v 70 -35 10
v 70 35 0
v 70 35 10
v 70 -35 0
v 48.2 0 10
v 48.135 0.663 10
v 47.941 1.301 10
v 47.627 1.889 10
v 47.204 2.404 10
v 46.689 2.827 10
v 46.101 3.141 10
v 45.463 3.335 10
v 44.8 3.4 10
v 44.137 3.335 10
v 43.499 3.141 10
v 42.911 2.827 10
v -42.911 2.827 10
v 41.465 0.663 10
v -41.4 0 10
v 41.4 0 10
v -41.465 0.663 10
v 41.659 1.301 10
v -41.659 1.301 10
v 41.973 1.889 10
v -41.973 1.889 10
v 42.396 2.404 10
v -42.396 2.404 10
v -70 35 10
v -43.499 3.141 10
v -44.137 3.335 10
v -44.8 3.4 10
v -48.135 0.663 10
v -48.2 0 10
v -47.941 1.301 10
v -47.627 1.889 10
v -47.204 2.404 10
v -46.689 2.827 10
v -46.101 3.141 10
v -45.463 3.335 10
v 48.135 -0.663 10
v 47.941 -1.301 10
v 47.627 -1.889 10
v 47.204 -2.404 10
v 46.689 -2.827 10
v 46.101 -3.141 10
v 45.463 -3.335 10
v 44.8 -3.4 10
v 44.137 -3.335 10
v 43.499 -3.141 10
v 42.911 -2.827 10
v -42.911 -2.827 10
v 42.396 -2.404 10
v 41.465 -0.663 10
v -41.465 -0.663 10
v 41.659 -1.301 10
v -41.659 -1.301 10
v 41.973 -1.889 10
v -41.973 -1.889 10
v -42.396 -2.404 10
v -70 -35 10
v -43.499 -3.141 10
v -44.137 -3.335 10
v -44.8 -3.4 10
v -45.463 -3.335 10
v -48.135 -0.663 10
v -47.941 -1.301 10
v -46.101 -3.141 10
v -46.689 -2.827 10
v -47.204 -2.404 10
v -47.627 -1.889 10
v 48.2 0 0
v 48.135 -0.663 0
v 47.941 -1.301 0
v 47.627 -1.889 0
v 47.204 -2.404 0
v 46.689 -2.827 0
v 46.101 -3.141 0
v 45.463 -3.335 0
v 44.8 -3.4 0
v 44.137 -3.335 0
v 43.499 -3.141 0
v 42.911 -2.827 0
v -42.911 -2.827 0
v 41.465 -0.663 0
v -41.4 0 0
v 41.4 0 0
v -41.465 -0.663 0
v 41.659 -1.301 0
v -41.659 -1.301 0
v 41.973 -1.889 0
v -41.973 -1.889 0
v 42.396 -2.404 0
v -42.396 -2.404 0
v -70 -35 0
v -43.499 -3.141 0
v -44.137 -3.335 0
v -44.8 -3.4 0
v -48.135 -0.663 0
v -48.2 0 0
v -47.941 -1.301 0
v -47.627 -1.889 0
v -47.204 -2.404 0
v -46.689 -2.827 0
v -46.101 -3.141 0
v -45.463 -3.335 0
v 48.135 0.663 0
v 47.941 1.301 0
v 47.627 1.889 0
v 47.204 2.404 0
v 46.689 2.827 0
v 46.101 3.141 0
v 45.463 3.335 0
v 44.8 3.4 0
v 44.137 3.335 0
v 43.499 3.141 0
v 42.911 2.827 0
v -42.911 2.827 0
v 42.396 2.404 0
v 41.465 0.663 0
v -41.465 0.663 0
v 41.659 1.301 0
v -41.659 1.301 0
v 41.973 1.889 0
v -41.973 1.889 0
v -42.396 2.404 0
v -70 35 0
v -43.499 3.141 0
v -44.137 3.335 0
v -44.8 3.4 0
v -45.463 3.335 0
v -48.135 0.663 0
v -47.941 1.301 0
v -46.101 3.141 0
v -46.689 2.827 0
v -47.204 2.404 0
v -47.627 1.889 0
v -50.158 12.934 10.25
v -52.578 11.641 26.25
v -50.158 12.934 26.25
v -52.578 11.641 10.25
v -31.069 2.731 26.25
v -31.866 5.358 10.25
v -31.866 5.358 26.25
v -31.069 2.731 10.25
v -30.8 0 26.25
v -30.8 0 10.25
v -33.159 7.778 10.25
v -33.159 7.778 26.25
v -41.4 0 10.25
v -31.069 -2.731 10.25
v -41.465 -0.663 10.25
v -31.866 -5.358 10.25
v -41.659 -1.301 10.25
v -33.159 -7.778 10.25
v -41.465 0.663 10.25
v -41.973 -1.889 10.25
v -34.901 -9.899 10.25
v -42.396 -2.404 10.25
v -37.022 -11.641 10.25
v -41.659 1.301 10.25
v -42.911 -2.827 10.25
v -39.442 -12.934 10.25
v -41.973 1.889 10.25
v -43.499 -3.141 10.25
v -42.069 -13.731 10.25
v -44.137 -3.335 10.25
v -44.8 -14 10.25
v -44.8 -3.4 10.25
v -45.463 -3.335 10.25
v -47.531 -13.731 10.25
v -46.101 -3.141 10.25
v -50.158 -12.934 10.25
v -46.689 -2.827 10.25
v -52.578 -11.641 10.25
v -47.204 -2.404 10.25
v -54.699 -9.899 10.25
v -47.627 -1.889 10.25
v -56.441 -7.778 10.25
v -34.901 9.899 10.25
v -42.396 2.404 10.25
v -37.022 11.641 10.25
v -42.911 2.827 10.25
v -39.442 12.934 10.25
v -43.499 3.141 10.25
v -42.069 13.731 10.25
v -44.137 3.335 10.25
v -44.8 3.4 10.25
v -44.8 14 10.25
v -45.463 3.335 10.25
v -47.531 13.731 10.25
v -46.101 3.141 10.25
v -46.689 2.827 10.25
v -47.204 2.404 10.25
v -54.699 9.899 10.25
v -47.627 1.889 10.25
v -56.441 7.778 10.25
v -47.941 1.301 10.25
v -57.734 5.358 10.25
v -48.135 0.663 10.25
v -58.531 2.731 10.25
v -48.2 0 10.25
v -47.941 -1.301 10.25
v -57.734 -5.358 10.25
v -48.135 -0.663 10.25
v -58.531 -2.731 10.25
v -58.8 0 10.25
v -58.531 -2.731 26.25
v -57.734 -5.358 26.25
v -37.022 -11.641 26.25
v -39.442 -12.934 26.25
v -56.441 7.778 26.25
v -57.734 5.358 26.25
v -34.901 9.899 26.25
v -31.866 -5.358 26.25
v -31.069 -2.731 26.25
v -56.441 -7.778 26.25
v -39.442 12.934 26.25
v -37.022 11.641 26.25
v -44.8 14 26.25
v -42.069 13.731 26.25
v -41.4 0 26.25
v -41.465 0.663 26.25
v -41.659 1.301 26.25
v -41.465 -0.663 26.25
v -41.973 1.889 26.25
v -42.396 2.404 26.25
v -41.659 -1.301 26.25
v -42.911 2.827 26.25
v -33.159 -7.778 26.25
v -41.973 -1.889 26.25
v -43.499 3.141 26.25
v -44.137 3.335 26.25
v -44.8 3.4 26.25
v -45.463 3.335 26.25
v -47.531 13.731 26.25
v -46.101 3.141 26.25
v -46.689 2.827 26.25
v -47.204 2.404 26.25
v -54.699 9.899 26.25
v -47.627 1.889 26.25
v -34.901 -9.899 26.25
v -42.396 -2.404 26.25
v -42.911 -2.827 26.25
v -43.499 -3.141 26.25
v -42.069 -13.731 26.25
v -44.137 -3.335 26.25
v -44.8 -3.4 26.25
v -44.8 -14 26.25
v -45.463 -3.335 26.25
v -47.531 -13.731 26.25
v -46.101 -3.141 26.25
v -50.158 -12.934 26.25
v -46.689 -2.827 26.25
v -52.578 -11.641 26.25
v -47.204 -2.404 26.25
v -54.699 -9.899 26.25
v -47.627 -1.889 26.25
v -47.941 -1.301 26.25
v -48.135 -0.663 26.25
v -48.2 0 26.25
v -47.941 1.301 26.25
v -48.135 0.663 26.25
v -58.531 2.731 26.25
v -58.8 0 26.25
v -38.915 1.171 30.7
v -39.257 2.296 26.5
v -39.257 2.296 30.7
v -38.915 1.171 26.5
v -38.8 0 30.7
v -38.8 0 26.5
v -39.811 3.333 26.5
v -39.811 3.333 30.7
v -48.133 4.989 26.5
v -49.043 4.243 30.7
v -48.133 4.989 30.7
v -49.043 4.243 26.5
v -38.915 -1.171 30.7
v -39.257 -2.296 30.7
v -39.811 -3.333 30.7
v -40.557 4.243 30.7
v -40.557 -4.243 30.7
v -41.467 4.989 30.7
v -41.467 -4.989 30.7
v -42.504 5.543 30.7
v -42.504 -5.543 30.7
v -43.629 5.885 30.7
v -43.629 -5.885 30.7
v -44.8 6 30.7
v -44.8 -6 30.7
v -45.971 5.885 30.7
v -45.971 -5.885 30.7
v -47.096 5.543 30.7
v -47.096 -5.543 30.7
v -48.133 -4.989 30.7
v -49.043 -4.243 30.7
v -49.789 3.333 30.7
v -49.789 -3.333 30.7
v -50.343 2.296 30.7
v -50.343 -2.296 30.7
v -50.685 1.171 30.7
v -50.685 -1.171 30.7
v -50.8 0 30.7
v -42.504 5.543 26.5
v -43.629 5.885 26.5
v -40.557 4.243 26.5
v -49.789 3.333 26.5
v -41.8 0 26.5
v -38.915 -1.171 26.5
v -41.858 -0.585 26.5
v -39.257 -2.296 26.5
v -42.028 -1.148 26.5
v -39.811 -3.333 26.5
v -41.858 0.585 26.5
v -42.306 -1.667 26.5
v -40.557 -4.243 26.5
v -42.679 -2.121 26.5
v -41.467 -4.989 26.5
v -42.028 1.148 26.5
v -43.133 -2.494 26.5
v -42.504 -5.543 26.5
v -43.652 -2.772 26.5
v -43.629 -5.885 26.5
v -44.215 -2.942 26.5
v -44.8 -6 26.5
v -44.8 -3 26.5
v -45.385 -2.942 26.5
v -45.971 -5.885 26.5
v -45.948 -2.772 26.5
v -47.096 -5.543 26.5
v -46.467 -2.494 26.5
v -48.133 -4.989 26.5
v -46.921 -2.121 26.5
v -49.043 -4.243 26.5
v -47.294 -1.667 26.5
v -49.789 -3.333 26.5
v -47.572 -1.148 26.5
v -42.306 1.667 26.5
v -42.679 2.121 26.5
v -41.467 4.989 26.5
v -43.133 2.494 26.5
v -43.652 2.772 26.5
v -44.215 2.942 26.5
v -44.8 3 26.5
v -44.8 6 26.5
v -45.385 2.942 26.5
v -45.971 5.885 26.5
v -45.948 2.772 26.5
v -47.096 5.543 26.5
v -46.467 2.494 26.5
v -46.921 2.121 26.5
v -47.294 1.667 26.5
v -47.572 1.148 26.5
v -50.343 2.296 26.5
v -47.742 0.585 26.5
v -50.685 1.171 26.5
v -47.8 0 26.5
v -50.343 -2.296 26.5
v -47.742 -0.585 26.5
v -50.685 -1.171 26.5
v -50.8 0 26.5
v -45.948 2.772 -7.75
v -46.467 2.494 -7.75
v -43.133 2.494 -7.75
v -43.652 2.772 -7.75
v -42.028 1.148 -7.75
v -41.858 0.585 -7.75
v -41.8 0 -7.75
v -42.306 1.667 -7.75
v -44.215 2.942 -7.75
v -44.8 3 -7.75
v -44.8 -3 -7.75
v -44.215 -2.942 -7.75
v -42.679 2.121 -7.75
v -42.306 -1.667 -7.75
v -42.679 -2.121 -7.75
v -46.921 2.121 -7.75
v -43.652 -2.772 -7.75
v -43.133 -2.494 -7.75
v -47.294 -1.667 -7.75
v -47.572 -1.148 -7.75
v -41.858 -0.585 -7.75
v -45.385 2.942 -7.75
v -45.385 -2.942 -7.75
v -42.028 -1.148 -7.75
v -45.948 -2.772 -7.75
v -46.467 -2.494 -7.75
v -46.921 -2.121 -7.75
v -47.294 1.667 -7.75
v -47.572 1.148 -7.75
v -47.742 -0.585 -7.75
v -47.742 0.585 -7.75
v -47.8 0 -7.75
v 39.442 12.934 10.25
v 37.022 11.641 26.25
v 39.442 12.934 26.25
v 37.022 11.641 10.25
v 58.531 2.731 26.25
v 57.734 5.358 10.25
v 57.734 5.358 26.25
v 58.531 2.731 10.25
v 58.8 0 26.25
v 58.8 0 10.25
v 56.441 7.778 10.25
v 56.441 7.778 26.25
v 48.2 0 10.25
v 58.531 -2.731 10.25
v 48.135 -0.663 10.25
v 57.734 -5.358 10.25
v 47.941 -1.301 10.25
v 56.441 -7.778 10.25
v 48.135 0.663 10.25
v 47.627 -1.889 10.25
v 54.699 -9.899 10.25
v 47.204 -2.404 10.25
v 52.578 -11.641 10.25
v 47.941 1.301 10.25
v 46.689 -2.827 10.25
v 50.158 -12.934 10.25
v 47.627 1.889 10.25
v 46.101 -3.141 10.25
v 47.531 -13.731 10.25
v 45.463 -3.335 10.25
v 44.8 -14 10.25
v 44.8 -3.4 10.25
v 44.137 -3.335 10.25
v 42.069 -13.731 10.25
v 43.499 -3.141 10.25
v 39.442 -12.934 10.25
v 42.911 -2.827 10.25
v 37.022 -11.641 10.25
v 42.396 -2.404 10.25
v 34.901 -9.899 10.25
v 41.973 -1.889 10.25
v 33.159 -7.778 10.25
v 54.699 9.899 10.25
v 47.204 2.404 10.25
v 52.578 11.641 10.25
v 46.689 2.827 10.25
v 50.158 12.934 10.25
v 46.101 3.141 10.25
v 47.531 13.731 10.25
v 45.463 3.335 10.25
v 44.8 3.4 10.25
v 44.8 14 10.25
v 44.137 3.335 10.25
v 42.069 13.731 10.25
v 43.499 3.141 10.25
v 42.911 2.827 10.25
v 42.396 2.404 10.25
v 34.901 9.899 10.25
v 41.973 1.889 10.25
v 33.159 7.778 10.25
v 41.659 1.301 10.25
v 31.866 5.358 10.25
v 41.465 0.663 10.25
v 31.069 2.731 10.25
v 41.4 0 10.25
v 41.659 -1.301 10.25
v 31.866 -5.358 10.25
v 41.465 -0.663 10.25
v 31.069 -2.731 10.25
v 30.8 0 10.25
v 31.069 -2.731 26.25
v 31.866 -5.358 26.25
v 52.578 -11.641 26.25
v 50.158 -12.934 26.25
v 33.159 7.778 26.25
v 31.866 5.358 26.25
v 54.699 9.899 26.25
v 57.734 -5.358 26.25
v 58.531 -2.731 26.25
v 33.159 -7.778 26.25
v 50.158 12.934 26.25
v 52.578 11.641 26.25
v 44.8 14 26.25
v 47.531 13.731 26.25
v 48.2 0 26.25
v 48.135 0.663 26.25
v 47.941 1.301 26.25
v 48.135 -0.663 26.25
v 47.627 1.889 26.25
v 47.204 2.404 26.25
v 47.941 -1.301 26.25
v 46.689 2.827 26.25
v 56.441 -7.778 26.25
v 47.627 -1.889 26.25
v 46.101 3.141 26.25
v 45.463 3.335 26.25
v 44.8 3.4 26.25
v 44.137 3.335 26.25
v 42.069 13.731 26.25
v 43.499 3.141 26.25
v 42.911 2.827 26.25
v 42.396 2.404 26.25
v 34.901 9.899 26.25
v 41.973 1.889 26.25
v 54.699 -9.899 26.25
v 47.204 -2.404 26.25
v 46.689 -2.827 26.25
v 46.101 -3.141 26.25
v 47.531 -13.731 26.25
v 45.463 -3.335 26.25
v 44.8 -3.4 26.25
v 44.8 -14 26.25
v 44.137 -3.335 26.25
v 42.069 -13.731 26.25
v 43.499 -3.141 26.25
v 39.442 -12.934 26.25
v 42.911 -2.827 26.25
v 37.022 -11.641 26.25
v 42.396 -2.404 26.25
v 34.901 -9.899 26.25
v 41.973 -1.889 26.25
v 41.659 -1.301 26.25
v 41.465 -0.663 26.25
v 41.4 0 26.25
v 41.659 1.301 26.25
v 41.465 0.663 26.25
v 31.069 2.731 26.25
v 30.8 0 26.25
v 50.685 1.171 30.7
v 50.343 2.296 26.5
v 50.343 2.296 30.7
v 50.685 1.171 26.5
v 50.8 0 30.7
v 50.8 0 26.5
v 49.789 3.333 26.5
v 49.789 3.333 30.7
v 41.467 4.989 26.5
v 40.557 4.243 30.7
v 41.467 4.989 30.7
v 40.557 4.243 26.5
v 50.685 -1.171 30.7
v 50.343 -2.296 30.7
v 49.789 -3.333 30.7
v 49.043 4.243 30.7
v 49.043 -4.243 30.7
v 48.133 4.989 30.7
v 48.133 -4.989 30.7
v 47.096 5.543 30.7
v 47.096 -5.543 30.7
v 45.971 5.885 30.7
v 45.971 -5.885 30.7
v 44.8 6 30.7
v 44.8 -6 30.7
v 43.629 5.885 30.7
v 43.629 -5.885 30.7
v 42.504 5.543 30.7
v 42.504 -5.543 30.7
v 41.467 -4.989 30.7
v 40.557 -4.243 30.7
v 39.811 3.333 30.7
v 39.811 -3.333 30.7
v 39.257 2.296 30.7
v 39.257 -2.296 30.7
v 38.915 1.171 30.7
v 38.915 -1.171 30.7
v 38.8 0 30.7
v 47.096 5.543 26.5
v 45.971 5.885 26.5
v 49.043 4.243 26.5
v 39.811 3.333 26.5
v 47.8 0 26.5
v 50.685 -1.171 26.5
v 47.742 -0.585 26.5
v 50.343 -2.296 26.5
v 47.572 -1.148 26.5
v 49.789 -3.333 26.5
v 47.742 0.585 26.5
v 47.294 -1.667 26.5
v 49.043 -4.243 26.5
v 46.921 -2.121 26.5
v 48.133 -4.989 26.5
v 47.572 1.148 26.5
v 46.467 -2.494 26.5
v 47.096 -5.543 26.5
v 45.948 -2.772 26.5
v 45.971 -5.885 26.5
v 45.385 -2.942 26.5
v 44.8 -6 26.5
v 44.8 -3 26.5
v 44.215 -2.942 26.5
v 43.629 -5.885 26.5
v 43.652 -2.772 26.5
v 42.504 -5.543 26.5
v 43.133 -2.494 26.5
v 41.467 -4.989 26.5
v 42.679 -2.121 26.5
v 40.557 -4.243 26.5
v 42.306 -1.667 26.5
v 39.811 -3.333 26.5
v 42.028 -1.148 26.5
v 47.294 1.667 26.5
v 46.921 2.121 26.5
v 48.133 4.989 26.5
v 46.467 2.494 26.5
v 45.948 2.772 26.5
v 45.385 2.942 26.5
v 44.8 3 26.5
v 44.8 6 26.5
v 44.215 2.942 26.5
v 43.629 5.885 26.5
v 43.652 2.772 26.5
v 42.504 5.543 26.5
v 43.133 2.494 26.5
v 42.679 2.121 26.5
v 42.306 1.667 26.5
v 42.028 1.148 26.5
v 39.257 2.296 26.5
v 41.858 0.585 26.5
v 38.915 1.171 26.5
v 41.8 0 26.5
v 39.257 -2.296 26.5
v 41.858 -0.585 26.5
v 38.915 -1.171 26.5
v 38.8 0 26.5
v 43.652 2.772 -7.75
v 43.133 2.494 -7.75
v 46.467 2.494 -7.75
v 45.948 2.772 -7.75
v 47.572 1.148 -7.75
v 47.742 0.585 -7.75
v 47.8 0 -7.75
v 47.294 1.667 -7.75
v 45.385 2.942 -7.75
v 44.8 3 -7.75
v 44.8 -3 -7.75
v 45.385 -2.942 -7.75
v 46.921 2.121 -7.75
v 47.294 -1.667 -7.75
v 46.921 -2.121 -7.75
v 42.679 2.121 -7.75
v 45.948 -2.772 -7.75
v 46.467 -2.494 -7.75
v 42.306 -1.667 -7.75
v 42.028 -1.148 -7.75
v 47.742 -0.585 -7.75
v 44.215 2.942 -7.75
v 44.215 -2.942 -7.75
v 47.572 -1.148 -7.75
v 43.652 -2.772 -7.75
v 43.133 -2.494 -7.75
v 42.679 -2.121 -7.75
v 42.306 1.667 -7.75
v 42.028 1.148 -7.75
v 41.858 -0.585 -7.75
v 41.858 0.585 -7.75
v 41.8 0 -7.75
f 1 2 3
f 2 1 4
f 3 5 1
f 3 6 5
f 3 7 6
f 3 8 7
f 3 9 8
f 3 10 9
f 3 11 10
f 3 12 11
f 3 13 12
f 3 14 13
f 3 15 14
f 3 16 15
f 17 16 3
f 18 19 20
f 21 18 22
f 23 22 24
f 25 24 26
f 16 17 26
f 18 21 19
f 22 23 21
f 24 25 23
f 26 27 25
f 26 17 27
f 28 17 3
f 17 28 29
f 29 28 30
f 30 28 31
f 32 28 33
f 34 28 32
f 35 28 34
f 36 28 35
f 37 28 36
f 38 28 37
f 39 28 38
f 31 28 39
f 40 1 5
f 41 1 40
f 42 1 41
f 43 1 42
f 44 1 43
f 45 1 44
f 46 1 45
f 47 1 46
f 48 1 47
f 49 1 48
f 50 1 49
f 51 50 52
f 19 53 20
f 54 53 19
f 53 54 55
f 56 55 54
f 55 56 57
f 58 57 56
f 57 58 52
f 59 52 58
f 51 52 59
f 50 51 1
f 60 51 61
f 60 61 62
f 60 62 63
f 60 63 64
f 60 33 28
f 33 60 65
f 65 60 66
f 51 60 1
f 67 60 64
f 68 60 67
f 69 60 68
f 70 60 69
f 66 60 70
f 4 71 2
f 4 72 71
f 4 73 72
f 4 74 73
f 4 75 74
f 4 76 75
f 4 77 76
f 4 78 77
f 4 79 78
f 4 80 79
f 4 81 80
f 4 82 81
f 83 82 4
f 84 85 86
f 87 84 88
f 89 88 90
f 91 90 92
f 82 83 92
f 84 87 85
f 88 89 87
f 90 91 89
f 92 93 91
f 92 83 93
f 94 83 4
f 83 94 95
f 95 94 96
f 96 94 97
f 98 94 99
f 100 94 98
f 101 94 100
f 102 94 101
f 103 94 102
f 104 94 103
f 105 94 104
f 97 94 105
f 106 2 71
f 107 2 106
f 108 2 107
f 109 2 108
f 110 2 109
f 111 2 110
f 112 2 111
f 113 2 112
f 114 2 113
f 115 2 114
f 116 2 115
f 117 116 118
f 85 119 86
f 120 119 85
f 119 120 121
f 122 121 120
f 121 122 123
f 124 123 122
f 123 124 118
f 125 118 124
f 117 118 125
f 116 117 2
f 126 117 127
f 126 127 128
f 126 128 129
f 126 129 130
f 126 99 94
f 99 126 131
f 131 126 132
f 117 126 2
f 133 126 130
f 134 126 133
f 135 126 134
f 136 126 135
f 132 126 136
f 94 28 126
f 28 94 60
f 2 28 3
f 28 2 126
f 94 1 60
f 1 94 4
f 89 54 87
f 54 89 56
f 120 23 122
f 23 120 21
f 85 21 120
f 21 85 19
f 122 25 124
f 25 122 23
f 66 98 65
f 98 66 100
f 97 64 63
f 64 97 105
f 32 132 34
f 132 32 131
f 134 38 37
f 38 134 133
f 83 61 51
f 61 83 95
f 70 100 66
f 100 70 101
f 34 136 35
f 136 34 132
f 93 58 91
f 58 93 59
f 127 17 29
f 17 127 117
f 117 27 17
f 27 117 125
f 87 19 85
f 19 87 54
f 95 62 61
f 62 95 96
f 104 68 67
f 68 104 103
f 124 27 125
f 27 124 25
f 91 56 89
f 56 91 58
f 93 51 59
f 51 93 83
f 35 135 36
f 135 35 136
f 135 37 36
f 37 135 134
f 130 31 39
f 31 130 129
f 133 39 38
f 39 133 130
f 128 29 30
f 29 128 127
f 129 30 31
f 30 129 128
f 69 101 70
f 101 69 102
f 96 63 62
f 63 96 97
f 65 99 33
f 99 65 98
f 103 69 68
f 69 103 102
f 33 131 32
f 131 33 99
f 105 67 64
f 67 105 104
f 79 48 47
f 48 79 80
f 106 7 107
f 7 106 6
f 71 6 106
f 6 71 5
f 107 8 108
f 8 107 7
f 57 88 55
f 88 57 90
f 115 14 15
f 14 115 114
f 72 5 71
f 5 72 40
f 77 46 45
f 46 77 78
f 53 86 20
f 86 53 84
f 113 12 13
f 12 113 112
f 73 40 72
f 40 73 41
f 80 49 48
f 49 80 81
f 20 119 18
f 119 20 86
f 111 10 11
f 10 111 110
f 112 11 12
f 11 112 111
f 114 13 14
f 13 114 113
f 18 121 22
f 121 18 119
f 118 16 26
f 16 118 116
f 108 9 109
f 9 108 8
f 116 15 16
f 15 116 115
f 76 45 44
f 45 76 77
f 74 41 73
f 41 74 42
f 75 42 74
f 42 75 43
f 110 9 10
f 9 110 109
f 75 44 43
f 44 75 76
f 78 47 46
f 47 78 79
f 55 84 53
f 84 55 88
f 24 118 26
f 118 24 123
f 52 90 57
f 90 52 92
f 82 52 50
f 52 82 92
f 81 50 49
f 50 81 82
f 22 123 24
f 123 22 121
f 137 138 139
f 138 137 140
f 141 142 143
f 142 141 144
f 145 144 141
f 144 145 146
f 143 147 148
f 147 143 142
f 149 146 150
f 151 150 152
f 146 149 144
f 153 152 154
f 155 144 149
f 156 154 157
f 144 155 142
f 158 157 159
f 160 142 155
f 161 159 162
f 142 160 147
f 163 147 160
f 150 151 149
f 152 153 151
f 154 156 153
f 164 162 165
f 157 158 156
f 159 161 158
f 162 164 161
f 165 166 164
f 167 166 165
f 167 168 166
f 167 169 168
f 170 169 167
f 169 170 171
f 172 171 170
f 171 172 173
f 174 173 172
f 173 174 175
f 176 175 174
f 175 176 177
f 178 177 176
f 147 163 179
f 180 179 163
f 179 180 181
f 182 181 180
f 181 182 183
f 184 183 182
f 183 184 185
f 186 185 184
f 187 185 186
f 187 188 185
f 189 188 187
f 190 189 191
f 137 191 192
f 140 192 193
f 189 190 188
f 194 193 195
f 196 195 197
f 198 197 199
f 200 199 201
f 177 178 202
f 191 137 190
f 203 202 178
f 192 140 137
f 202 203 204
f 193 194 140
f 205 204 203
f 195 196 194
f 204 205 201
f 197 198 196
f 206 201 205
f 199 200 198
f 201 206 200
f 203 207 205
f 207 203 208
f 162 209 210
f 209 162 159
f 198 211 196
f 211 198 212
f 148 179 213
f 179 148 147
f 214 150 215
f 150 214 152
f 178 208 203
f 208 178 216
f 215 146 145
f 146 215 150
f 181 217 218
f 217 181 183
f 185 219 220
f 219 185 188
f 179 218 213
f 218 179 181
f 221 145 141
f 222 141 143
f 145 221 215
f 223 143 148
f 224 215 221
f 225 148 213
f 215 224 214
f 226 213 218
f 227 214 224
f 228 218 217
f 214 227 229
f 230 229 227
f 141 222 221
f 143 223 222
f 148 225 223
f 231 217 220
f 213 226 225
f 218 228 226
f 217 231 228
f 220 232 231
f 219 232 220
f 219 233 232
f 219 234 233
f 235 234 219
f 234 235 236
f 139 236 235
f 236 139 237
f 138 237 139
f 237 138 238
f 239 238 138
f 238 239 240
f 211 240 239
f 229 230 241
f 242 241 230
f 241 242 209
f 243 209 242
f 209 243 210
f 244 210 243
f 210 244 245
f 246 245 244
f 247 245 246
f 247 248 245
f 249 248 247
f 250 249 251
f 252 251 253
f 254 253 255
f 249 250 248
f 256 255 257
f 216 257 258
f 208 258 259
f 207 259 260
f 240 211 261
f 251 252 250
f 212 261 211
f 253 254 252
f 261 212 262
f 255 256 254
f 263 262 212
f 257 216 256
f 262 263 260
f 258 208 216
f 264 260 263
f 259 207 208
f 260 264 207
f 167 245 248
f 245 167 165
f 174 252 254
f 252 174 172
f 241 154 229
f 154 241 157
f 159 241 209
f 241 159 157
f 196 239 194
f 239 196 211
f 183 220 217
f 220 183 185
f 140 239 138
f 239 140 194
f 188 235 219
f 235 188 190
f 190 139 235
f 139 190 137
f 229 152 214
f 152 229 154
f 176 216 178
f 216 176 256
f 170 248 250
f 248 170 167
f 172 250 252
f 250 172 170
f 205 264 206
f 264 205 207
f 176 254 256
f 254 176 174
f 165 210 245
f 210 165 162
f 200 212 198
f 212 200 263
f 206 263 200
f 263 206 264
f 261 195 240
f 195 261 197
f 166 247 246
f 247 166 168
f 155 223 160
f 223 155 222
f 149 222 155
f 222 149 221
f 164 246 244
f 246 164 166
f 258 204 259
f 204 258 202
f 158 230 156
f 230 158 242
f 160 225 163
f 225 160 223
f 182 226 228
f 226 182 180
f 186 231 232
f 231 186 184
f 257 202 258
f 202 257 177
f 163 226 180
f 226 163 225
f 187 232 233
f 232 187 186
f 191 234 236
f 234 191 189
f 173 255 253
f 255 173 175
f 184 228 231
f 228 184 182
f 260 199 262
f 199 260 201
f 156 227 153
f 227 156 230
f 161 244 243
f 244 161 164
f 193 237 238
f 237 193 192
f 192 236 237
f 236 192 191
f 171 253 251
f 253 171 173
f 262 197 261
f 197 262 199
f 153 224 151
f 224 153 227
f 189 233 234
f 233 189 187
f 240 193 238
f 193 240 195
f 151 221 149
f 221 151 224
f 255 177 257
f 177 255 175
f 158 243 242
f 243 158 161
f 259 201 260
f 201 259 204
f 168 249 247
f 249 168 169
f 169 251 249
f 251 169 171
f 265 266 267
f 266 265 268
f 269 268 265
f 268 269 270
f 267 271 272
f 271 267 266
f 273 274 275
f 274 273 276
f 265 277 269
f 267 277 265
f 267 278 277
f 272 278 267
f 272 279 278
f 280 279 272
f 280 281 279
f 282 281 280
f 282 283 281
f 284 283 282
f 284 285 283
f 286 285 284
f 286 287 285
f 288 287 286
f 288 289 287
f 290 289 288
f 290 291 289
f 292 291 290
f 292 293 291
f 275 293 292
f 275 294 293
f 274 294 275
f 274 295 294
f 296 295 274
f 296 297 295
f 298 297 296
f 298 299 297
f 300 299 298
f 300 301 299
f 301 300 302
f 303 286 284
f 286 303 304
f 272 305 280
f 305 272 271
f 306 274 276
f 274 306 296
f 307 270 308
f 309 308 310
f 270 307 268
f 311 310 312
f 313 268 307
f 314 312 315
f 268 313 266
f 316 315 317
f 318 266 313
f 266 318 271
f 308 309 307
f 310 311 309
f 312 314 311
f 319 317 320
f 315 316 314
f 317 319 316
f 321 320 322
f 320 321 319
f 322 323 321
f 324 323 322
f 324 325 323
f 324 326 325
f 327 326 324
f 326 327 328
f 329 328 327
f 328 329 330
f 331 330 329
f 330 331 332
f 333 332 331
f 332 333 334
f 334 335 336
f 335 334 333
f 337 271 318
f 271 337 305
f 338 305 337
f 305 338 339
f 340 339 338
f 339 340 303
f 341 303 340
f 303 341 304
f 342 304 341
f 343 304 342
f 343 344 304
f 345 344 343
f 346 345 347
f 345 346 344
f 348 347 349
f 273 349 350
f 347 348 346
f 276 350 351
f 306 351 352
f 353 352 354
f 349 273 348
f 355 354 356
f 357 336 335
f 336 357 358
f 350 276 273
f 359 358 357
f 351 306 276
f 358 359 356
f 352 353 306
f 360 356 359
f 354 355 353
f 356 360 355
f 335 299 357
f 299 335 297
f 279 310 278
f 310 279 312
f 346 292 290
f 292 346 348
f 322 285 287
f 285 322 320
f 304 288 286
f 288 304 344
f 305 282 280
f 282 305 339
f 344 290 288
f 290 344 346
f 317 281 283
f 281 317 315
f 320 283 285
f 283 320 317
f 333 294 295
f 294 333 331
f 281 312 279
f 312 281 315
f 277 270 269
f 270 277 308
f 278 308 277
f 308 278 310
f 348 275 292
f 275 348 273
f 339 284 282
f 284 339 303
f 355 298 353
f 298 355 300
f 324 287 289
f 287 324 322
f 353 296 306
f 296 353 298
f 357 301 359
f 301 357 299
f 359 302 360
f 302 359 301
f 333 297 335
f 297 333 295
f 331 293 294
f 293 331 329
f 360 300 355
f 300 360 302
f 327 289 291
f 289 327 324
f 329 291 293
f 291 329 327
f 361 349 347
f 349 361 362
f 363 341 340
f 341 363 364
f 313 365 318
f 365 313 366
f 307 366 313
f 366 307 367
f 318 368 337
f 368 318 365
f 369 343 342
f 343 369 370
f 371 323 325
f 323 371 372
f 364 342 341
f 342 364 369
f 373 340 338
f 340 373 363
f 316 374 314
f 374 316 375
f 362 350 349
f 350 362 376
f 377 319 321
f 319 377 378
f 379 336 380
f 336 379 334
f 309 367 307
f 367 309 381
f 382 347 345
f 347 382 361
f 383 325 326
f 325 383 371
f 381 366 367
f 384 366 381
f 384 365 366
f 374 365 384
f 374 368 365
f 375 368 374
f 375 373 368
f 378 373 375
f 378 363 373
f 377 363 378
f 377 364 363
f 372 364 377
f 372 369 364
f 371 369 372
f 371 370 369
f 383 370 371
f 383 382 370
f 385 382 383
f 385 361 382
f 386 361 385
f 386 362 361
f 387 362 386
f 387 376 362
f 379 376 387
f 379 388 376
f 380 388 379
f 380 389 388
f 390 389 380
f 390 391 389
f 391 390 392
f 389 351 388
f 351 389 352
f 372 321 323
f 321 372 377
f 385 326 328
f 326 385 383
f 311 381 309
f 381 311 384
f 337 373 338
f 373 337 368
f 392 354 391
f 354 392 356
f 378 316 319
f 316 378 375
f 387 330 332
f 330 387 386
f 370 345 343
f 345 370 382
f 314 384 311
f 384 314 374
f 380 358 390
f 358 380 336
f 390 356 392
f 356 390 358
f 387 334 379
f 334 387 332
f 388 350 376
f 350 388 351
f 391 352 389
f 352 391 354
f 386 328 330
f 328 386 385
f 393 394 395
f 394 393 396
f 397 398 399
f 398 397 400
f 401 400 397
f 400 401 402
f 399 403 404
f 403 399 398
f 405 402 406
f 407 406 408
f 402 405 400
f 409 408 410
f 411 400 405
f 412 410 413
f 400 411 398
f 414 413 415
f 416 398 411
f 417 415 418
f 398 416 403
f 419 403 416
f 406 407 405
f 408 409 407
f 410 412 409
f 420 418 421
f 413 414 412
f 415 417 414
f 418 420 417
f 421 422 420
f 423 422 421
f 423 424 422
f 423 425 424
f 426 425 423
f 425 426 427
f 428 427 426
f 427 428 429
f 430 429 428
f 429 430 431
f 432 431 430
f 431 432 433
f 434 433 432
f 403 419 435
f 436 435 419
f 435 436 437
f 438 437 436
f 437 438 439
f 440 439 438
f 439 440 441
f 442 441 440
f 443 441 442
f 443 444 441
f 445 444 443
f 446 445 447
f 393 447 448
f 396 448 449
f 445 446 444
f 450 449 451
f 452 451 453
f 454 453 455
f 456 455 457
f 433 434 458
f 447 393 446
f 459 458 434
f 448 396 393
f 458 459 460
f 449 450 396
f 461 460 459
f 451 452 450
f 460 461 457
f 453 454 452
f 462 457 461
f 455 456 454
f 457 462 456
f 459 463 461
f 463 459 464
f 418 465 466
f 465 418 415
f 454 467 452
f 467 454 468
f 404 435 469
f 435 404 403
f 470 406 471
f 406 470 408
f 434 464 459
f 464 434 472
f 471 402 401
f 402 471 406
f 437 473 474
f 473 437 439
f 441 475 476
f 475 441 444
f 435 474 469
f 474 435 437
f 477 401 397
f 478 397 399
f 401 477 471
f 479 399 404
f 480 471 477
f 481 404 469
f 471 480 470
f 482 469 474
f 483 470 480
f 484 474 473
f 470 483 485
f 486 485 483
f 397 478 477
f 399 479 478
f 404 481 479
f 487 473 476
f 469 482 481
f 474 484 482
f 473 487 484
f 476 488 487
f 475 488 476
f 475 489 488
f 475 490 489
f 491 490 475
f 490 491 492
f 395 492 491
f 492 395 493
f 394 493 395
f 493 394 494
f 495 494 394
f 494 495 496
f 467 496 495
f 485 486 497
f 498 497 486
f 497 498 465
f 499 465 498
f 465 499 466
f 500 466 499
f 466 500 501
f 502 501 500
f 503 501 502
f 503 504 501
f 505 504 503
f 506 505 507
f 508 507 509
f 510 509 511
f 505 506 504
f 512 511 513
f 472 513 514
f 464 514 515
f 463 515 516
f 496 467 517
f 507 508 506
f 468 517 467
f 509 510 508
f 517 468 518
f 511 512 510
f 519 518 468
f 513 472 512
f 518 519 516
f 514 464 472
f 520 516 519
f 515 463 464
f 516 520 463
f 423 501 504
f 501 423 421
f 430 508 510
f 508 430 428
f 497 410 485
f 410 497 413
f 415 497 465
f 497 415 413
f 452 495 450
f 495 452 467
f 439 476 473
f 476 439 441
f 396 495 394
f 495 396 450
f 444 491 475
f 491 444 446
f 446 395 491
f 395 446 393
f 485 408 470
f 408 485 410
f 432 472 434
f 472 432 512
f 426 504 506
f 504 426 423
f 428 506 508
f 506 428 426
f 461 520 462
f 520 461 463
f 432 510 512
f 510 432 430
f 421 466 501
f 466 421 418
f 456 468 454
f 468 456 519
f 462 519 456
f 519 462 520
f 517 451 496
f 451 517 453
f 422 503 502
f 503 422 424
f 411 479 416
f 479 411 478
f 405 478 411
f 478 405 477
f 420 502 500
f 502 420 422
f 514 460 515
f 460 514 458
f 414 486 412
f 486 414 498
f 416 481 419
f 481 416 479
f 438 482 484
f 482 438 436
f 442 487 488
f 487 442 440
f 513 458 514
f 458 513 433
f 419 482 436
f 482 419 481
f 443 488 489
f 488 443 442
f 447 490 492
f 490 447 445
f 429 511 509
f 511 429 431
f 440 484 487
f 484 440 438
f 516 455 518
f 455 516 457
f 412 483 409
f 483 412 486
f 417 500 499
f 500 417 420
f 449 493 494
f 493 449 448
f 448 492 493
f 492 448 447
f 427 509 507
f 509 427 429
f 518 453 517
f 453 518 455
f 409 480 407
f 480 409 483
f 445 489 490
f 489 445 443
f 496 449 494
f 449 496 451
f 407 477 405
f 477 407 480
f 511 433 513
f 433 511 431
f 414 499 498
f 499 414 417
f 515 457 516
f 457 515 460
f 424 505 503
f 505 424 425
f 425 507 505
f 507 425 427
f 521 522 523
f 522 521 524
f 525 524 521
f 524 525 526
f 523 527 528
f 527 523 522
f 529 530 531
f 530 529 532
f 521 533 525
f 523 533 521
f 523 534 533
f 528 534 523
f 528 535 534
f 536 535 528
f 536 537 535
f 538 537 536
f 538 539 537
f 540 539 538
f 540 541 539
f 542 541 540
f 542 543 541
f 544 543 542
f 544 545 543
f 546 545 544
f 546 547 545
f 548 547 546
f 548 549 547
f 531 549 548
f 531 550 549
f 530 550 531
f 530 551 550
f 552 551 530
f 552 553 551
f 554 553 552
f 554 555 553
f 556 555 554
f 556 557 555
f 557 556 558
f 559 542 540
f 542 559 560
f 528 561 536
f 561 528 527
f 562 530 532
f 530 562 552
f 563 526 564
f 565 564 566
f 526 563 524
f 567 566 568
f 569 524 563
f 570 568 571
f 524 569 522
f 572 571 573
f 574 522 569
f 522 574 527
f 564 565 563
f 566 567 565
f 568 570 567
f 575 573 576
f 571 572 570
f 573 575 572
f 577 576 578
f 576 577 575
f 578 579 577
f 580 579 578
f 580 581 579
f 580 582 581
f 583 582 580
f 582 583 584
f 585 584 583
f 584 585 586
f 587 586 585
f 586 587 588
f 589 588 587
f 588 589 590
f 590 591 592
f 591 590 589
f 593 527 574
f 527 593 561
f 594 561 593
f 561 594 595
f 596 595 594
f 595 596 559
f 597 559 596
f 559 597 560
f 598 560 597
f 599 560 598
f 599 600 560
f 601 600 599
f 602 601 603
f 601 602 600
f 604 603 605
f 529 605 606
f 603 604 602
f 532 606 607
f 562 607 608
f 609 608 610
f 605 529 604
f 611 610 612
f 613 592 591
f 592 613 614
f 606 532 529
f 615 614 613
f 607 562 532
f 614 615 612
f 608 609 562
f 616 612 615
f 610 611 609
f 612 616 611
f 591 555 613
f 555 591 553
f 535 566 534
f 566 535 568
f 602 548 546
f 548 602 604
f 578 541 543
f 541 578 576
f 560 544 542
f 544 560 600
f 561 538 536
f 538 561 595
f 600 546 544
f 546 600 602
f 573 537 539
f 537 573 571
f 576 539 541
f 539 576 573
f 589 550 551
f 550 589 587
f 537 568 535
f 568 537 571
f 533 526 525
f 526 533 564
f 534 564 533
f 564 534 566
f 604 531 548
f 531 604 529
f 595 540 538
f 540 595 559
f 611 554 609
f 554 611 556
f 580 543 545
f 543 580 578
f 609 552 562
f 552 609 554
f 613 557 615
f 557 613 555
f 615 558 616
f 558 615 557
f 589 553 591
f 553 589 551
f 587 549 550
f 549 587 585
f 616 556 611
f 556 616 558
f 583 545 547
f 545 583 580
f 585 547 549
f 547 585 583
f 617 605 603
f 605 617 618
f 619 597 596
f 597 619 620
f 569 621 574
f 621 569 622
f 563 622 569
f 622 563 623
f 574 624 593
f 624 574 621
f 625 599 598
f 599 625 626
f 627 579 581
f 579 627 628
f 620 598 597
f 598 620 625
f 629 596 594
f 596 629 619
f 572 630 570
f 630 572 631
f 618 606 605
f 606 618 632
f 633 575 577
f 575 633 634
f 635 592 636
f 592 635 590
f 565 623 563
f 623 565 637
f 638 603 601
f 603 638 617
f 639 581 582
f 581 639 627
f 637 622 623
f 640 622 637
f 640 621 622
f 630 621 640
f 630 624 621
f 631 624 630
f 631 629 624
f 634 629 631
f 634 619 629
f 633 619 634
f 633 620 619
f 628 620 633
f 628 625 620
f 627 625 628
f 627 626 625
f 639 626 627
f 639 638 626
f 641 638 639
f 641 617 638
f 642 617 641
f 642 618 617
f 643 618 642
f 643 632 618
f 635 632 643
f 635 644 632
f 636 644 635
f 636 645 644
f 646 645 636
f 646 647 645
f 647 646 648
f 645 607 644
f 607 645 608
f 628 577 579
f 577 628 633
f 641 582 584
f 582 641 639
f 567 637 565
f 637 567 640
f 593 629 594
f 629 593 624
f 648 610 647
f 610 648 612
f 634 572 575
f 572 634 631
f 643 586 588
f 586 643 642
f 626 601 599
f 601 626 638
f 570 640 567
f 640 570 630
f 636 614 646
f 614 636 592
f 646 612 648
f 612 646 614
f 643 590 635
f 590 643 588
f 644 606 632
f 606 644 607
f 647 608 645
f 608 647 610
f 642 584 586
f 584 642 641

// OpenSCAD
$fn = 32;

// ------------------------------------------------------------------------
// Standoff columns: 2 d28 standoffs, bolts d6
// Every part is its own module, assembly() places them once.
// ------------------------------------------------------------------------

// --- part 1 ---
module base_plate() {
  difference() {
    translate([-70, -35, 0]) cube([140, 70, 10]);
    translate([-44.8, 0, -1]) cylinder(h = 12, d = 6.8);
    translate([44.8, 0, -1]) cylinder(h = 12, d = 6.8);
  }
}

// --- part 2 ---
module spacer1() {
  difference() {
      translate([0, 0, 0]) cylinder(h = 16, d = 28);
      translate([0, 0, -1]) cylinder(h = 18, d = 6.8);
    }
}

// --- part 3 ---
module bolt1() {
  cylinder(h = 4.2, d = 12);
  translate([0, 0, -34.25]) cylinder(h = 34.25, d = 6);
}

// --- part 4 ---
module spacer2() {
  difference() {
      translate([0, 0, 0]) cylinder(h = 16, d = 28);
      translate([0, 0, -1]) cylinder(h = 18, d = 6.8);
    }
}

// --- part 5 ---
module bolt2() {
  cylinder(h = 4.2, d = 12);
  translate([0, 0, -34.25]) cylinder(h = 34.25, d = 6);
}

// --- assembly ---
module assembly() {
  translate([0, 0, 0]) rotate([0, 0, 0]) base_plate();
  translate([-44.8, 0, 10.25]) rotate([0, 0, 0]) spacer1();
  translate([-44.8, 0, 26.5]) rotate([0, 0, 0]) bolt1();
  translate([44.8, 0, 10.25]) rotate([0, 0, 0]) spacer2();
  translate([44.8, 0, 26.5]) rotate([0, 0, 0]) bolt2();
}

assembly();
